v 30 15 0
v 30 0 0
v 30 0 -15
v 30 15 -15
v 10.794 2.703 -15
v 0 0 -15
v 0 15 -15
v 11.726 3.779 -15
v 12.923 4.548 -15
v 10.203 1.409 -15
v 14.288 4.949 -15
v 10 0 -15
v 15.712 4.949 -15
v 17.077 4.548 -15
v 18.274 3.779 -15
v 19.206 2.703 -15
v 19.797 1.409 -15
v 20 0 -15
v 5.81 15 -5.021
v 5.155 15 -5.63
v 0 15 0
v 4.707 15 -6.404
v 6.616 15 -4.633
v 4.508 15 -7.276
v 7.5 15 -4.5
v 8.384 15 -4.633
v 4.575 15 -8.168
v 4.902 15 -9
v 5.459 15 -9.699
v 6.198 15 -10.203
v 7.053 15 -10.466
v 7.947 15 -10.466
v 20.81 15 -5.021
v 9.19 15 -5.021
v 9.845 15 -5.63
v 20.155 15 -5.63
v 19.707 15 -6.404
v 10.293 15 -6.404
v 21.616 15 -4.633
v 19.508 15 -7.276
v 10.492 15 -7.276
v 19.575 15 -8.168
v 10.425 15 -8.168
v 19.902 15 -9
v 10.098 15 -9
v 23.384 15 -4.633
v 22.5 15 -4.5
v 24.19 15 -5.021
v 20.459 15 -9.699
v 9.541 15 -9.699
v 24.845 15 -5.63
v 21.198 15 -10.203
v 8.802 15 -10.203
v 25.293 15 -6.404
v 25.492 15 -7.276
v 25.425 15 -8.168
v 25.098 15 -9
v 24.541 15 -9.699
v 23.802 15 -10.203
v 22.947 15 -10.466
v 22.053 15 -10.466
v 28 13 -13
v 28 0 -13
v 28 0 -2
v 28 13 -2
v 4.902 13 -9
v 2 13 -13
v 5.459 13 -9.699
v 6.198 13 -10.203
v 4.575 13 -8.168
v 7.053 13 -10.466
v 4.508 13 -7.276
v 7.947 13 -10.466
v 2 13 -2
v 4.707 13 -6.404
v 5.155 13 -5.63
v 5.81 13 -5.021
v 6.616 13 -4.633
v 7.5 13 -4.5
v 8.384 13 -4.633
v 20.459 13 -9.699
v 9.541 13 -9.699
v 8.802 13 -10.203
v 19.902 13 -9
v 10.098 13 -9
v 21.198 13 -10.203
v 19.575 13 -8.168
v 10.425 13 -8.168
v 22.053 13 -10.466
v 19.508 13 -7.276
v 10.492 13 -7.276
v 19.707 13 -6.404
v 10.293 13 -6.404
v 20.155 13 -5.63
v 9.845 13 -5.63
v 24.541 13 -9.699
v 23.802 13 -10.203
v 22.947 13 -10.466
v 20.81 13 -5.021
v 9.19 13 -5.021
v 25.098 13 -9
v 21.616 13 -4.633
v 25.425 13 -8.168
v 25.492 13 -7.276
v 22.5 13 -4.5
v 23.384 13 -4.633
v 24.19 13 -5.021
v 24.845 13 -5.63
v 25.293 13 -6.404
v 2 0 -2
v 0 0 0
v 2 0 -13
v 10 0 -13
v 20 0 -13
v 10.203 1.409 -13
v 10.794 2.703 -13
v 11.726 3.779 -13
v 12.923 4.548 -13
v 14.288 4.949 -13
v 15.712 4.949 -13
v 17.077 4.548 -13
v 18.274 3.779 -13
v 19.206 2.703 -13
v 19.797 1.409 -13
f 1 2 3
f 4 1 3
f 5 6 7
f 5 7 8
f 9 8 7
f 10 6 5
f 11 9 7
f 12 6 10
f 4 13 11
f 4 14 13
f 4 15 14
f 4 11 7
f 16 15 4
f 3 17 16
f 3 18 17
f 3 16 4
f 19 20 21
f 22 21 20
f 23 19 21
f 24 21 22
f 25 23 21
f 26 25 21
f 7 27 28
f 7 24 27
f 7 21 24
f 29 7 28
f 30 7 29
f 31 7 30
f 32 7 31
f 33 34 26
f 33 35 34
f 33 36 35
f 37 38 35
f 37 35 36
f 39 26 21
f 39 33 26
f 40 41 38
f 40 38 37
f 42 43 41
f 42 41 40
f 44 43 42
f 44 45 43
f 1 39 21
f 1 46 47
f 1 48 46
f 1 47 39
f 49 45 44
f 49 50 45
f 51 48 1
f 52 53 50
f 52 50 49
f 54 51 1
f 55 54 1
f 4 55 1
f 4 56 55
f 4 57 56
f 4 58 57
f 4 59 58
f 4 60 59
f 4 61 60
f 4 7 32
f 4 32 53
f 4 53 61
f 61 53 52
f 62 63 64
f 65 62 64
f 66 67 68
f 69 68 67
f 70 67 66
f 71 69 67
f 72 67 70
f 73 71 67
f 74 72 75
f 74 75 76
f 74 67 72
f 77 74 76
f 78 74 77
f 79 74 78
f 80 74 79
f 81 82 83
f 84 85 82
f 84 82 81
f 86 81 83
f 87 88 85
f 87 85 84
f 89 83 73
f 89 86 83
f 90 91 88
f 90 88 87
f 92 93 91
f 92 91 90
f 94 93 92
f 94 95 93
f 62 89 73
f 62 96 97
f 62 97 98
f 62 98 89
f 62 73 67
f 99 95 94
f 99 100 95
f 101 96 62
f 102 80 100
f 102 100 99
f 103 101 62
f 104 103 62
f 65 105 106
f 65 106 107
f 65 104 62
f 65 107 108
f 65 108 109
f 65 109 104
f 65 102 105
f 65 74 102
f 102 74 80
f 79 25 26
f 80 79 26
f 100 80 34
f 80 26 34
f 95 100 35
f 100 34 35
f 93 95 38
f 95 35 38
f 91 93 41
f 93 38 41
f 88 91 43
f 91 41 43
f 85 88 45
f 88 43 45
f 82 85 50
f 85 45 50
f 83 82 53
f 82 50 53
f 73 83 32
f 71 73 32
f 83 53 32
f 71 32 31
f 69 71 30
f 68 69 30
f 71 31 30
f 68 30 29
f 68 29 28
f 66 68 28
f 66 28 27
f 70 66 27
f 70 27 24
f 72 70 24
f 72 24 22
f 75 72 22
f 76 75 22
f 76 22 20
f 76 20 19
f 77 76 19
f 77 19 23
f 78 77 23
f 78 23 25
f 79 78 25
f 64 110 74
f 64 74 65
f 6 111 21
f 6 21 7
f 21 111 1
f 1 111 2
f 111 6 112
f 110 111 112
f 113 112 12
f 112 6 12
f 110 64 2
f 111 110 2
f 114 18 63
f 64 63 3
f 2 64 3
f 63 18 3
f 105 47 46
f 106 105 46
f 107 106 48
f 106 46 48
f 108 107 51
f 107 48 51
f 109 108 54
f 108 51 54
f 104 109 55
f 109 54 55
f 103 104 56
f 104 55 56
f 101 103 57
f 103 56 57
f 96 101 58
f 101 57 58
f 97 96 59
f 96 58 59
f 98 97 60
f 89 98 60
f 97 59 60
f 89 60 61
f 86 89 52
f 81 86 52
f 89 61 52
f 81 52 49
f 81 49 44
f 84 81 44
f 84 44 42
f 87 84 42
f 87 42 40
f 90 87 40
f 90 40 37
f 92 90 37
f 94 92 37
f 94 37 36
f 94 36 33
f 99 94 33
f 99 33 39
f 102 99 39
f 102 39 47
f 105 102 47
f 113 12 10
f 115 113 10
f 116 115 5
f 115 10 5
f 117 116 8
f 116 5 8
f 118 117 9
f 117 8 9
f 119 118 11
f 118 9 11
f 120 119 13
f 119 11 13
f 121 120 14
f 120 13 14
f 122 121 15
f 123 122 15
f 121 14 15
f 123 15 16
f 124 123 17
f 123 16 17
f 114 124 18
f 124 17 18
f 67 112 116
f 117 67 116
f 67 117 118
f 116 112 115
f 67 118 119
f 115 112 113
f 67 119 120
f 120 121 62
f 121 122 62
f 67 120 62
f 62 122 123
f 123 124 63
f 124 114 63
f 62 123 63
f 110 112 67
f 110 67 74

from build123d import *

# Parameters (mm, degrees)
SKETCH1_W           = 30
SKETCH1_H           = 15
BOSS_EXTRUDE1_DEPTH = 15
SKETCH2_W           = 26
SKETCH2_H           = 11
CUT_EXTRUDE1_DEPTH  = 13
SKETCH3_R           = 3
CUT_EXTRUDE2_DEPTH  = 13
SKETCH4_R           = 5
CUT_EXTRUDE3_DEPTH  = 5


with BuildPart() as part:
    # Sketch1 → Boss-Extrude1 (new body)
    with BuildSketch(Plane(origin=(0, 0, 0), x_dir=(1, 0, 0), z_dir=(0, 1, 0))):
        with Locations((15, 7.5)):
            Rectangle(SKETCH1_W, SKETCH1_H)
    extrude(amount=BOSS_EXTRUDE1_DEPTH)

    # Sketch2 → Cut-Extrude1 (cut)
    with BuildSketch(Plane.XZ):
        with Locations((15, -7.5)):
            Rectangle(SKETCH2_W, SKETCH2_H)
    extrude(amount=-CUT_EXTRUDE1_DEPTH, mode=Mode.SUBTRACT)

    # Sketch3 → Cut-Extrude2 (cut)
    with BuildSketch(Plane(origin=(0, 15, 0), x_dir=(1, 0, 0), z_dir=(0, 1, 0))):
        with Locations(Location((7.5, 7.5, 0), (0, 0, 270))):
            Circle(SKETCH3_R)
        with Locations(Location((22.5, 7.5, 0), (0, 0, 270))):
            Circle(SKETCH3_R)
    extrude(amount=-CUT_EXTRUDE2_DEPTH, mode=Mode.SUBTRACT)

    # Sketch4 → Cut-Extrude3 (cut)
    with BuildSketch(Plane(origin=(0, 0, -15), x_dir=(-1, 0, 0), z_dir=(0, 0, -1))):
        with Locations((-15, 0)):
            Circle(SKETCH4_R)
    extrude(amount=-CUT_EXTRUDE3_DEPTH, mode=Mode.SUBTRACT)


solid = part.part
